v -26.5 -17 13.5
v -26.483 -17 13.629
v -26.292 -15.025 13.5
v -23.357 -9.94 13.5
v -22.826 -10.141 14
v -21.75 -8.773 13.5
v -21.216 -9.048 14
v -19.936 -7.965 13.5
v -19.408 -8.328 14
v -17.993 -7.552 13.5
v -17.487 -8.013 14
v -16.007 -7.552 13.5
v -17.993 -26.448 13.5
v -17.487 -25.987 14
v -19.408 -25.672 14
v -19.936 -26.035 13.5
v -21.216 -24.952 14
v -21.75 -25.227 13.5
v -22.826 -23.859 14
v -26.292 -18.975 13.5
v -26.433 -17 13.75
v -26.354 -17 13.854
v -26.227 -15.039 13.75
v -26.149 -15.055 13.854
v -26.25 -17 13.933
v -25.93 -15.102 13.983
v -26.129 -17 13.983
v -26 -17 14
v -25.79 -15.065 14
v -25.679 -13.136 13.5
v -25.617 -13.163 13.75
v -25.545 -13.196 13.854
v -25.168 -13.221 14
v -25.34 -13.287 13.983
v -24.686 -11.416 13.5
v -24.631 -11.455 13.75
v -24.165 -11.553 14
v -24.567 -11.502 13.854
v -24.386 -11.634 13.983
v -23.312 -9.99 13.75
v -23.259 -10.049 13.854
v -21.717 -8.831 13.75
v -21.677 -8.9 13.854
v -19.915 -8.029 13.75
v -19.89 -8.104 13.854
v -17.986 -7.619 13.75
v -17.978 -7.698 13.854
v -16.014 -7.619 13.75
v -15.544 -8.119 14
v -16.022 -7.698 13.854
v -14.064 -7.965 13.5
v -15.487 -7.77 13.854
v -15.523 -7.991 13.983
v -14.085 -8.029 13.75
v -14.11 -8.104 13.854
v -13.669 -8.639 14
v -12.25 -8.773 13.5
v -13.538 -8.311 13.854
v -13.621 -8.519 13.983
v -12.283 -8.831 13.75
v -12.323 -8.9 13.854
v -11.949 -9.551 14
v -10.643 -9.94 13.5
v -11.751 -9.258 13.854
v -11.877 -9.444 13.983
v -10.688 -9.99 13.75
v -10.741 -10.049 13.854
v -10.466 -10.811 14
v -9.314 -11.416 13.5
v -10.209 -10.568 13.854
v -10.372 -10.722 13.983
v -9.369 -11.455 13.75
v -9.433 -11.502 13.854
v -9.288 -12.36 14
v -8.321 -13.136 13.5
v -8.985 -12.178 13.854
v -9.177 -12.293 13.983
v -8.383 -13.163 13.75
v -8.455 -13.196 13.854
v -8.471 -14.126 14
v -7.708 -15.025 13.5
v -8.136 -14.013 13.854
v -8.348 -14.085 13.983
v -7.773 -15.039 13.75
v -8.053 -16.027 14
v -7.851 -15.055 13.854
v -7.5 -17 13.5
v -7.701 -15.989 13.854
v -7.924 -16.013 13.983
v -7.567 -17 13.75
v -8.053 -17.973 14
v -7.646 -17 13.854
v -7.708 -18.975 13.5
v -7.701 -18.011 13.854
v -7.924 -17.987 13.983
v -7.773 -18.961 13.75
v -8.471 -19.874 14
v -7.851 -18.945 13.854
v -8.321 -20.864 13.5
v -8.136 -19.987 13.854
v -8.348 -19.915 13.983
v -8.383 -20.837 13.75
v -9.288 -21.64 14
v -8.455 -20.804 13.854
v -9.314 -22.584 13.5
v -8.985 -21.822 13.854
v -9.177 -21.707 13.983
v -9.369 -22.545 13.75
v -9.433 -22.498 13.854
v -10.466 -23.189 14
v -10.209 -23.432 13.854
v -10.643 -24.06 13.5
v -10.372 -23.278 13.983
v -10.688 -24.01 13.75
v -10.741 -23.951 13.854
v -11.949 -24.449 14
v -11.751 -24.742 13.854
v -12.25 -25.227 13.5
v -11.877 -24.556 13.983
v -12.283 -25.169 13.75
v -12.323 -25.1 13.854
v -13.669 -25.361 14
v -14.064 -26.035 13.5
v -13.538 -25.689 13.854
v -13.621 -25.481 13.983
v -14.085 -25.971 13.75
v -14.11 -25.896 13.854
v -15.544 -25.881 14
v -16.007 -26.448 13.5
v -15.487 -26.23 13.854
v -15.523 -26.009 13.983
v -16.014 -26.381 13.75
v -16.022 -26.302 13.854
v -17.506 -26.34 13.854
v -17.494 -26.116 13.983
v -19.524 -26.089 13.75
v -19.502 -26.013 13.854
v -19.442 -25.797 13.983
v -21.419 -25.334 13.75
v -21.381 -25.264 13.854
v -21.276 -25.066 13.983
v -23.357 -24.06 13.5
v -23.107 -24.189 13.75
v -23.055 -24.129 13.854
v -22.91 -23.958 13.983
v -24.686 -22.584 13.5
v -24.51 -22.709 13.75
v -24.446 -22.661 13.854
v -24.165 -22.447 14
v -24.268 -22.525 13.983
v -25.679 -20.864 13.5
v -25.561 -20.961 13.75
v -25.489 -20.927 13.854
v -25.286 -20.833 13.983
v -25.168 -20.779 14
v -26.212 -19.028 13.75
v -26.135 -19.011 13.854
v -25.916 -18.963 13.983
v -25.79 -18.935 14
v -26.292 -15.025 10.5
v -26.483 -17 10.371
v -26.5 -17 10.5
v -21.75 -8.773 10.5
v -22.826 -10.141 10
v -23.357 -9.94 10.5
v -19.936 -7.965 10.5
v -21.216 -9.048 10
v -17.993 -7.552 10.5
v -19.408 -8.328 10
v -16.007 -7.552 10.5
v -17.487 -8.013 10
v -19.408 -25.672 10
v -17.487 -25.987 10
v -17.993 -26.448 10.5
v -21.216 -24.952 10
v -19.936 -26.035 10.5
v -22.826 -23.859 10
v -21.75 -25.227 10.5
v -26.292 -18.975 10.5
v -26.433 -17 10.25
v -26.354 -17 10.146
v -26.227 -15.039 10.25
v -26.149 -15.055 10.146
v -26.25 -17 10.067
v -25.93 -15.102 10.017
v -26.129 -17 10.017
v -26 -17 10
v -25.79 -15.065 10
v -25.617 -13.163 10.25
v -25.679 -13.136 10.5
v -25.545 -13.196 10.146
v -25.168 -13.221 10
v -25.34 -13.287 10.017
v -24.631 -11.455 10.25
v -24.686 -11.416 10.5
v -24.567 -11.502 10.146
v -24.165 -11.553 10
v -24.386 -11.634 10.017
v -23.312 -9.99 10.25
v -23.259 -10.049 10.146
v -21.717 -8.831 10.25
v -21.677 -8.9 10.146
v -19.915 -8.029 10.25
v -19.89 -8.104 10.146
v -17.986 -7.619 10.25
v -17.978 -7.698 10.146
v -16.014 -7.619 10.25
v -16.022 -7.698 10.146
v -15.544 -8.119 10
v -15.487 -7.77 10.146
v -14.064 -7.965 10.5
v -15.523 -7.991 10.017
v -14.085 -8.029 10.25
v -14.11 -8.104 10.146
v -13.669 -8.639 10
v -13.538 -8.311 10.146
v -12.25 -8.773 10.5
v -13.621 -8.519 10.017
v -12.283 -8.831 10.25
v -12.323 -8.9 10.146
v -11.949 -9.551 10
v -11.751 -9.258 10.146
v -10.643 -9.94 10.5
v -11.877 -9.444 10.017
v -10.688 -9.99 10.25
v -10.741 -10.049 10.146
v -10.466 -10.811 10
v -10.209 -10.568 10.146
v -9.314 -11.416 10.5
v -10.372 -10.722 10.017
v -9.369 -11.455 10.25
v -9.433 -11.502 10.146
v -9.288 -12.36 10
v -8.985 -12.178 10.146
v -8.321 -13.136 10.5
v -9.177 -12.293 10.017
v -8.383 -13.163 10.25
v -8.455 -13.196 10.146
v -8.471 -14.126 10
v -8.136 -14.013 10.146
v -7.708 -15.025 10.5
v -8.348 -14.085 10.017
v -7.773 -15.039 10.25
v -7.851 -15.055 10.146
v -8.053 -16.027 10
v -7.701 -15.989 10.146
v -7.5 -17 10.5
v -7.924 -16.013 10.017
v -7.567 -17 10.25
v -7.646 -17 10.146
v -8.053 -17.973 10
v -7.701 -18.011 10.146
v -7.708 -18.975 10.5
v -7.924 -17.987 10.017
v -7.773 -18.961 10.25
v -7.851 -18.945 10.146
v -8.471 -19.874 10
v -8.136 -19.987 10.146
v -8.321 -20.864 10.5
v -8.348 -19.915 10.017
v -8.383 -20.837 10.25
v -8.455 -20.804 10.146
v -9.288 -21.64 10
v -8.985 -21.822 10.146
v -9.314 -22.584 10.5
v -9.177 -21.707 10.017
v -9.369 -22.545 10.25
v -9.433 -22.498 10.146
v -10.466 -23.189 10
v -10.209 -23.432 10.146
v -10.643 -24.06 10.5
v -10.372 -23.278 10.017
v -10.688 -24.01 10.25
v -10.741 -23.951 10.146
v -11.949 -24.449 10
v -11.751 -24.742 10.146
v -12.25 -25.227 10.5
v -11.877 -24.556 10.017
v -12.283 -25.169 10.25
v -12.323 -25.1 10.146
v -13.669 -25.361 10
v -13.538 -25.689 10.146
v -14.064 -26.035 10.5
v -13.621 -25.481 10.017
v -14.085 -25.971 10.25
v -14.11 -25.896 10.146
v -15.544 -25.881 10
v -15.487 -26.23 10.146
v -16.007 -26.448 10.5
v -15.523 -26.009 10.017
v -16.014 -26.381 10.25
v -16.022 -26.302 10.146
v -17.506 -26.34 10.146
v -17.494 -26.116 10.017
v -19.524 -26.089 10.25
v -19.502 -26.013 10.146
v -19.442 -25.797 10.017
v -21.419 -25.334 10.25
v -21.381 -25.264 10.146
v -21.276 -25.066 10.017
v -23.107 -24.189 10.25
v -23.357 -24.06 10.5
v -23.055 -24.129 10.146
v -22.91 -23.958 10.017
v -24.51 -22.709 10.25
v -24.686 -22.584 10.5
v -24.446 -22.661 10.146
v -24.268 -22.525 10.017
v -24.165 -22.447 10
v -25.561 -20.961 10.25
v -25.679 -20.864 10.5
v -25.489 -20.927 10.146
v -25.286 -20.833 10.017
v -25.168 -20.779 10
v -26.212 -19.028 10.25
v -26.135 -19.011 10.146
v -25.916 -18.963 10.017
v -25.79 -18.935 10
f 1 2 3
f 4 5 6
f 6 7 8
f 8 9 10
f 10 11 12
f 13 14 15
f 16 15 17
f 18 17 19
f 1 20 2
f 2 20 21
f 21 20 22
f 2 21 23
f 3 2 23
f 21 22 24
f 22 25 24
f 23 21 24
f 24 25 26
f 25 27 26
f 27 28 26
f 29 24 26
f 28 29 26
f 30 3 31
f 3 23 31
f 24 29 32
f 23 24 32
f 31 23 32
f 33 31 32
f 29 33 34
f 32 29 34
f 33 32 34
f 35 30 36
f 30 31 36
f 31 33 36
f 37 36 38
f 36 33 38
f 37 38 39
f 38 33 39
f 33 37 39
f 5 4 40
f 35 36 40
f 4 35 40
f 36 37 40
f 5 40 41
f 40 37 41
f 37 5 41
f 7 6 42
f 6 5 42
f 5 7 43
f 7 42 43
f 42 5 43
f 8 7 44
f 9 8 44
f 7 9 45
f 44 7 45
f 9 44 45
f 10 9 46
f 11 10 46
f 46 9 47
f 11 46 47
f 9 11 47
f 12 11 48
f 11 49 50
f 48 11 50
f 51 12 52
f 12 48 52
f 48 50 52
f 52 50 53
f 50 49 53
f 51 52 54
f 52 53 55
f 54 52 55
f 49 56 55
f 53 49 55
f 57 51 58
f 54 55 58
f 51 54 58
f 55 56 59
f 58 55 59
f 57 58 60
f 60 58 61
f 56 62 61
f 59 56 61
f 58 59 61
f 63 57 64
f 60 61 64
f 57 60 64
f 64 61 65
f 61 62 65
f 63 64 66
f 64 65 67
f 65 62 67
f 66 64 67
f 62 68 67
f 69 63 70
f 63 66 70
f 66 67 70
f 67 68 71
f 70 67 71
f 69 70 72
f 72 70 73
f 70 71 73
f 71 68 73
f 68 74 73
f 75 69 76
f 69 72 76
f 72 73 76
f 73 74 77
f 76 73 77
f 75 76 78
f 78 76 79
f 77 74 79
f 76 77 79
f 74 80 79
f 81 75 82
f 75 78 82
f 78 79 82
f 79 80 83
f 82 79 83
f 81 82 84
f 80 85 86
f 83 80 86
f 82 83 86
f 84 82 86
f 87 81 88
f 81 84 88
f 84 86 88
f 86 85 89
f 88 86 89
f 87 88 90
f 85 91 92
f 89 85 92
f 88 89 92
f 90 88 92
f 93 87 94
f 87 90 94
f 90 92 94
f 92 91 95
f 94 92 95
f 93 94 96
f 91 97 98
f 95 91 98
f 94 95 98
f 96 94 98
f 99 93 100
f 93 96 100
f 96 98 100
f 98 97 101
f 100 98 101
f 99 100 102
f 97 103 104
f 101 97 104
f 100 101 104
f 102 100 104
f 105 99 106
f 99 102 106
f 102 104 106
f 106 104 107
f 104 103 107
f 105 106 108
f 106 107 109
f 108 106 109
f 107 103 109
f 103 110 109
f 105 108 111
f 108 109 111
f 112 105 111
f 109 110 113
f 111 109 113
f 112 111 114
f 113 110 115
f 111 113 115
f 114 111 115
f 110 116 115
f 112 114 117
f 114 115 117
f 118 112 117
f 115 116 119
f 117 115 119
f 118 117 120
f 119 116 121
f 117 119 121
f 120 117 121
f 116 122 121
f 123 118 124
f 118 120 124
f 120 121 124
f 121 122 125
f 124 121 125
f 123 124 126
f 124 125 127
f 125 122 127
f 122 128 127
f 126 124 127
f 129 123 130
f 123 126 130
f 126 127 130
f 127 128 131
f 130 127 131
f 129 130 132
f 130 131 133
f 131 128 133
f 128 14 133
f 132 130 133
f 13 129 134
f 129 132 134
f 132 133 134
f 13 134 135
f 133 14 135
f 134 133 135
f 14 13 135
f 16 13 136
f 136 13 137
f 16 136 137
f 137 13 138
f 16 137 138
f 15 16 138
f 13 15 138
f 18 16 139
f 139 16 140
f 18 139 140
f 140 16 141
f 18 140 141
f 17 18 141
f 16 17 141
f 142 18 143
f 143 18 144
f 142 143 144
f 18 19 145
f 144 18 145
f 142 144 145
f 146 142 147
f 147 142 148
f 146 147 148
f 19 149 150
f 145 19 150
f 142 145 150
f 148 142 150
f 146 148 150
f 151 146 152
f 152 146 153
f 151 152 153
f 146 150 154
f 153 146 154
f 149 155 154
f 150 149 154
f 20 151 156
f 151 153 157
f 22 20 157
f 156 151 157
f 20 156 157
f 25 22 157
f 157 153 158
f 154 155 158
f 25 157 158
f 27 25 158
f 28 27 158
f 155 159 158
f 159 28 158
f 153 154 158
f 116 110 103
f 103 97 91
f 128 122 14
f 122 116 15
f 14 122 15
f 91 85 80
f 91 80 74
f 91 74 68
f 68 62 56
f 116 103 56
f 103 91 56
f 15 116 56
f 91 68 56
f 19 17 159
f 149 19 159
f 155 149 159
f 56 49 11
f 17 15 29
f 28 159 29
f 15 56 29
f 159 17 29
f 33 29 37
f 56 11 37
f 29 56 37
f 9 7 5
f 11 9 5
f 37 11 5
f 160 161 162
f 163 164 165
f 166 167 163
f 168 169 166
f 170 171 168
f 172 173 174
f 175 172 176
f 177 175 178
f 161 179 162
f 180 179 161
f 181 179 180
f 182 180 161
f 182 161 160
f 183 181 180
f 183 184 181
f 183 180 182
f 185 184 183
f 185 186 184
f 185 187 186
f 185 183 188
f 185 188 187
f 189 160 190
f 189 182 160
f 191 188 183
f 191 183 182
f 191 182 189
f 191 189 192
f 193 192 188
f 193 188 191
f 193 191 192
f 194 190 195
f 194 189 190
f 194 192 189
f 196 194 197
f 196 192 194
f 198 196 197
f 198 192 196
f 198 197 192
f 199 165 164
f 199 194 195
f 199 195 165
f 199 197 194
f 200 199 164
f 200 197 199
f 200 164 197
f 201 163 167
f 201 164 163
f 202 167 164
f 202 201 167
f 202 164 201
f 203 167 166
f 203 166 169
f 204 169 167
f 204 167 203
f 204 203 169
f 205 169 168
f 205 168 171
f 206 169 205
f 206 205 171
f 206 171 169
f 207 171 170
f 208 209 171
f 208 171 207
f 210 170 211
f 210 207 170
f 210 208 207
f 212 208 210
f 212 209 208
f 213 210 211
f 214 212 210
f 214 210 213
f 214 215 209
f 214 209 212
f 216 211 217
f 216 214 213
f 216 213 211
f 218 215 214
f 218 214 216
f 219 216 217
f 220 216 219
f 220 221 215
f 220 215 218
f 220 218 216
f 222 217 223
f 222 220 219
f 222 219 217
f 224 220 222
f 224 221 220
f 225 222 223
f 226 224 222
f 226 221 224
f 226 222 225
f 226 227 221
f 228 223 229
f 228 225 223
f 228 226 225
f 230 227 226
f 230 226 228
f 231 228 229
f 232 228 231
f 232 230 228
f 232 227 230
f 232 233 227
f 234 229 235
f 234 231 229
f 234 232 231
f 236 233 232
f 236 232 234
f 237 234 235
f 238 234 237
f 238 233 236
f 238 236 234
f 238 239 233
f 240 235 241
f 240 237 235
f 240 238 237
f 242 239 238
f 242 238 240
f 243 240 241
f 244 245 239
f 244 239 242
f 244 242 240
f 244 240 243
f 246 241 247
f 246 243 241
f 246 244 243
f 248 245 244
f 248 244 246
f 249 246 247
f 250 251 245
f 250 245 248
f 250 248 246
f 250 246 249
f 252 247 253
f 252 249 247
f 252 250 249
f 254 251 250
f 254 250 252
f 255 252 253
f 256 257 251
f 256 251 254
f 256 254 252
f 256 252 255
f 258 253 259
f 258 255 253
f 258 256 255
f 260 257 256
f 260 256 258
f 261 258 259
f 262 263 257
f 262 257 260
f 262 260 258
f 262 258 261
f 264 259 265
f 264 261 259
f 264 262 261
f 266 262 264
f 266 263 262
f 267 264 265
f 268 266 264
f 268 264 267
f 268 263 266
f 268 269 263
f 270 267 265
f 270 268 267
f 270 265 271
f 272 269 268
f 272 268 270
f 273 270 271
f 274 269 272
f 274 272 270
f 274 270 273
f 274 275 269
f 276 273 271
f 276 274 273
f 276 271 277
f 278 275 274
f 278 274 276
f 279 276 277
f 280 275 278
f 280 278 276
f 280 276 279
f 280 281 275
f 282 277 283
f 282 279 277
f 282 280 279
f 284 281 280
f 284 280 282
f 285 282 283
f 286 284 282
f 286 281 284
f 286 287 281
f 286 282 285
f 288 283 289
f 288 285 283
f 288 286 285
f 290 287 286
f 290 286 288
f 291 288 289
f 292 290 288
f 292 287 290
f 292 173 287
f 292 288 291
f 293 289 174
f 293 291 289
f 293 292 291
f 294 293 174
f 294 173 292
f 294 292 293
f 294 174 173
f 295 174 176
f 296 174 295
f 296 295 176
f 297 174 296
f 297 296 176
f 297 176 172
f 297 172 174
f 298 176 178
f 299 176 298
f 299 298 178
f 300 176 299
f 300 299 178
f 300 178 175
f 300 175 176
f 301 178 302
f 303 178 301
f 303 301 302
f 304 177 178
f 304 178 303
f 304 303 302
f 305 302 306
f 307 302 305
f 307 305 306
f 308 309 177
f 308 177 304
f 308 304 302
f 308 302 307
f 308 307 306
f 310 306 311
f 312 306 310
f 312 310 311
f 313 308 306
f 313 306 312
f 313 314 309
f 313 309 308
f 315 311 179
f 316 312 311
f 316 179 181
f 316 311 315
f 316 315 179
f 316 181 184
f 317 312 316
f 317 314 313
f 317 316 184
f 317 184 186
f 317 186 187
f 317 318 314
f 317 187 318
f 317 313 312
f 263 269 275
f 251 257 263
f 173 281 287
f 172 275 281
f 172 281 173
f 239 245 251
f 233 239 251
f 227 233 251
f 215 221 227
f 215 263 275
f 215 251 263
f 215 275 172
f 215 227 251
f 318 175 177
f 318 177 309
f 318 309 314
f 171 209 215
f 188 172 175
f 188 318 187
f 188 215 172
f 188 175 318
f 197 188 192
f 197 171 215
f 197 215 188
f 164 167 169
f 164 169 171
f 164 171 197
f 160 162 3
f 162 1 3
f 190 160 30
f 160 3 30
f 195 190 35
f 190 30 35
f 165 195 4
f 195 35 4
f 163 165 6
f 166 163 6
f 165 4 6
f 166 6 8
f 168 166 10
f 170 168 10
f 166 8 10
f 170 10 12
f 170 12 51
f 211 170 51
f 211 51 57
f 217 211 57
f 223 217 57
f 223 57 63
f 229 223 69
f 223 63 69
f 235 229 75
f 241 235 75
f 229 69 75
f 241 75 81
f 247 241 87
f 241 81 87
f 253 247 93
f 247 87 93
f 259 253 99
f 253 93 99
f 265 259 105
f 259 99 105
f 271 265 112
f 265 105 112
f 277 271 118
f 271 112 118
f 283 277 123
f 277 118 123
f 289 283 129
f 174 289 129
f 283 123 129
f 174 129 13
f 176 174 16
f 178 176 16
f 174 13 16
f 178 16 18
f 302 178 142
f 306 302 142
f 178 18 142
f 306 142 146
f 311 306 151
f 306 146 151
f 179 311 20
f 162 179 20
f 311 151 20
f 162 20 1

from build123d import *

# Parameters (mm, degrees)
CYLINDER007_R             = 9.5
CYLINDER007_DEPTH         = 2
FILLET007_R               = 0.5
CYLINDER006_R             = 9.5
CYLINDER006_DEPTH         = 2
FILLET006_R               = 0.5
FUSION005_PLACEMENT_ANGLE = 180


with BuildPart() as fillet007:
    # Cylinder007 → Cylinder007 (new body)
    with BuildSketch(Plane.XY.offset(12)):
        Circle(CYLINDER007_R)
    extrude(amount=CYLINDER007_DEPTH)

    # Fillet007
    fillet007_edges = [fillet007.edges().sort_by_distance(p)[0] for p in [
        (-9.5, 0, 14),
    ]]
    fillet(fillet007_edges, radius=FILLET007_R)


with BuildPart() as disc003:
    # Cylinder006 → Cylinder006 (new body)
    with BuildSketch(Plane.XY.offset(11)):
        Circle(CYLINDER006_R)
    extrude(amount=CYLINDER006_DEPTH)

    # Fillet006
    fillet006_edges = [disc003.edges().sort_by_distance(p)[0] for p in [
        (-9.5, 0, 11),
    ]]
    fillet(fillet006_edges, radius=FILLET006_R)


with BuildPart() as disc003_1:
    # Fillet006 placement: moved
    add(disc003.part.moved(Location((0, 0, -1))))

    # Fusion005: union Fillet007
    add(fillet007.part)


with BuildPart() as disc003_2:
    # Fusion005 placement: moved
    add(disc003_1.part.moved(Location((-17, -17, 24))).rotate(Axis((-17, -17, 24), (0, 1, 0)), FUSION005_PLACEMENT_ANGLE))


solid = disc003_2.part
